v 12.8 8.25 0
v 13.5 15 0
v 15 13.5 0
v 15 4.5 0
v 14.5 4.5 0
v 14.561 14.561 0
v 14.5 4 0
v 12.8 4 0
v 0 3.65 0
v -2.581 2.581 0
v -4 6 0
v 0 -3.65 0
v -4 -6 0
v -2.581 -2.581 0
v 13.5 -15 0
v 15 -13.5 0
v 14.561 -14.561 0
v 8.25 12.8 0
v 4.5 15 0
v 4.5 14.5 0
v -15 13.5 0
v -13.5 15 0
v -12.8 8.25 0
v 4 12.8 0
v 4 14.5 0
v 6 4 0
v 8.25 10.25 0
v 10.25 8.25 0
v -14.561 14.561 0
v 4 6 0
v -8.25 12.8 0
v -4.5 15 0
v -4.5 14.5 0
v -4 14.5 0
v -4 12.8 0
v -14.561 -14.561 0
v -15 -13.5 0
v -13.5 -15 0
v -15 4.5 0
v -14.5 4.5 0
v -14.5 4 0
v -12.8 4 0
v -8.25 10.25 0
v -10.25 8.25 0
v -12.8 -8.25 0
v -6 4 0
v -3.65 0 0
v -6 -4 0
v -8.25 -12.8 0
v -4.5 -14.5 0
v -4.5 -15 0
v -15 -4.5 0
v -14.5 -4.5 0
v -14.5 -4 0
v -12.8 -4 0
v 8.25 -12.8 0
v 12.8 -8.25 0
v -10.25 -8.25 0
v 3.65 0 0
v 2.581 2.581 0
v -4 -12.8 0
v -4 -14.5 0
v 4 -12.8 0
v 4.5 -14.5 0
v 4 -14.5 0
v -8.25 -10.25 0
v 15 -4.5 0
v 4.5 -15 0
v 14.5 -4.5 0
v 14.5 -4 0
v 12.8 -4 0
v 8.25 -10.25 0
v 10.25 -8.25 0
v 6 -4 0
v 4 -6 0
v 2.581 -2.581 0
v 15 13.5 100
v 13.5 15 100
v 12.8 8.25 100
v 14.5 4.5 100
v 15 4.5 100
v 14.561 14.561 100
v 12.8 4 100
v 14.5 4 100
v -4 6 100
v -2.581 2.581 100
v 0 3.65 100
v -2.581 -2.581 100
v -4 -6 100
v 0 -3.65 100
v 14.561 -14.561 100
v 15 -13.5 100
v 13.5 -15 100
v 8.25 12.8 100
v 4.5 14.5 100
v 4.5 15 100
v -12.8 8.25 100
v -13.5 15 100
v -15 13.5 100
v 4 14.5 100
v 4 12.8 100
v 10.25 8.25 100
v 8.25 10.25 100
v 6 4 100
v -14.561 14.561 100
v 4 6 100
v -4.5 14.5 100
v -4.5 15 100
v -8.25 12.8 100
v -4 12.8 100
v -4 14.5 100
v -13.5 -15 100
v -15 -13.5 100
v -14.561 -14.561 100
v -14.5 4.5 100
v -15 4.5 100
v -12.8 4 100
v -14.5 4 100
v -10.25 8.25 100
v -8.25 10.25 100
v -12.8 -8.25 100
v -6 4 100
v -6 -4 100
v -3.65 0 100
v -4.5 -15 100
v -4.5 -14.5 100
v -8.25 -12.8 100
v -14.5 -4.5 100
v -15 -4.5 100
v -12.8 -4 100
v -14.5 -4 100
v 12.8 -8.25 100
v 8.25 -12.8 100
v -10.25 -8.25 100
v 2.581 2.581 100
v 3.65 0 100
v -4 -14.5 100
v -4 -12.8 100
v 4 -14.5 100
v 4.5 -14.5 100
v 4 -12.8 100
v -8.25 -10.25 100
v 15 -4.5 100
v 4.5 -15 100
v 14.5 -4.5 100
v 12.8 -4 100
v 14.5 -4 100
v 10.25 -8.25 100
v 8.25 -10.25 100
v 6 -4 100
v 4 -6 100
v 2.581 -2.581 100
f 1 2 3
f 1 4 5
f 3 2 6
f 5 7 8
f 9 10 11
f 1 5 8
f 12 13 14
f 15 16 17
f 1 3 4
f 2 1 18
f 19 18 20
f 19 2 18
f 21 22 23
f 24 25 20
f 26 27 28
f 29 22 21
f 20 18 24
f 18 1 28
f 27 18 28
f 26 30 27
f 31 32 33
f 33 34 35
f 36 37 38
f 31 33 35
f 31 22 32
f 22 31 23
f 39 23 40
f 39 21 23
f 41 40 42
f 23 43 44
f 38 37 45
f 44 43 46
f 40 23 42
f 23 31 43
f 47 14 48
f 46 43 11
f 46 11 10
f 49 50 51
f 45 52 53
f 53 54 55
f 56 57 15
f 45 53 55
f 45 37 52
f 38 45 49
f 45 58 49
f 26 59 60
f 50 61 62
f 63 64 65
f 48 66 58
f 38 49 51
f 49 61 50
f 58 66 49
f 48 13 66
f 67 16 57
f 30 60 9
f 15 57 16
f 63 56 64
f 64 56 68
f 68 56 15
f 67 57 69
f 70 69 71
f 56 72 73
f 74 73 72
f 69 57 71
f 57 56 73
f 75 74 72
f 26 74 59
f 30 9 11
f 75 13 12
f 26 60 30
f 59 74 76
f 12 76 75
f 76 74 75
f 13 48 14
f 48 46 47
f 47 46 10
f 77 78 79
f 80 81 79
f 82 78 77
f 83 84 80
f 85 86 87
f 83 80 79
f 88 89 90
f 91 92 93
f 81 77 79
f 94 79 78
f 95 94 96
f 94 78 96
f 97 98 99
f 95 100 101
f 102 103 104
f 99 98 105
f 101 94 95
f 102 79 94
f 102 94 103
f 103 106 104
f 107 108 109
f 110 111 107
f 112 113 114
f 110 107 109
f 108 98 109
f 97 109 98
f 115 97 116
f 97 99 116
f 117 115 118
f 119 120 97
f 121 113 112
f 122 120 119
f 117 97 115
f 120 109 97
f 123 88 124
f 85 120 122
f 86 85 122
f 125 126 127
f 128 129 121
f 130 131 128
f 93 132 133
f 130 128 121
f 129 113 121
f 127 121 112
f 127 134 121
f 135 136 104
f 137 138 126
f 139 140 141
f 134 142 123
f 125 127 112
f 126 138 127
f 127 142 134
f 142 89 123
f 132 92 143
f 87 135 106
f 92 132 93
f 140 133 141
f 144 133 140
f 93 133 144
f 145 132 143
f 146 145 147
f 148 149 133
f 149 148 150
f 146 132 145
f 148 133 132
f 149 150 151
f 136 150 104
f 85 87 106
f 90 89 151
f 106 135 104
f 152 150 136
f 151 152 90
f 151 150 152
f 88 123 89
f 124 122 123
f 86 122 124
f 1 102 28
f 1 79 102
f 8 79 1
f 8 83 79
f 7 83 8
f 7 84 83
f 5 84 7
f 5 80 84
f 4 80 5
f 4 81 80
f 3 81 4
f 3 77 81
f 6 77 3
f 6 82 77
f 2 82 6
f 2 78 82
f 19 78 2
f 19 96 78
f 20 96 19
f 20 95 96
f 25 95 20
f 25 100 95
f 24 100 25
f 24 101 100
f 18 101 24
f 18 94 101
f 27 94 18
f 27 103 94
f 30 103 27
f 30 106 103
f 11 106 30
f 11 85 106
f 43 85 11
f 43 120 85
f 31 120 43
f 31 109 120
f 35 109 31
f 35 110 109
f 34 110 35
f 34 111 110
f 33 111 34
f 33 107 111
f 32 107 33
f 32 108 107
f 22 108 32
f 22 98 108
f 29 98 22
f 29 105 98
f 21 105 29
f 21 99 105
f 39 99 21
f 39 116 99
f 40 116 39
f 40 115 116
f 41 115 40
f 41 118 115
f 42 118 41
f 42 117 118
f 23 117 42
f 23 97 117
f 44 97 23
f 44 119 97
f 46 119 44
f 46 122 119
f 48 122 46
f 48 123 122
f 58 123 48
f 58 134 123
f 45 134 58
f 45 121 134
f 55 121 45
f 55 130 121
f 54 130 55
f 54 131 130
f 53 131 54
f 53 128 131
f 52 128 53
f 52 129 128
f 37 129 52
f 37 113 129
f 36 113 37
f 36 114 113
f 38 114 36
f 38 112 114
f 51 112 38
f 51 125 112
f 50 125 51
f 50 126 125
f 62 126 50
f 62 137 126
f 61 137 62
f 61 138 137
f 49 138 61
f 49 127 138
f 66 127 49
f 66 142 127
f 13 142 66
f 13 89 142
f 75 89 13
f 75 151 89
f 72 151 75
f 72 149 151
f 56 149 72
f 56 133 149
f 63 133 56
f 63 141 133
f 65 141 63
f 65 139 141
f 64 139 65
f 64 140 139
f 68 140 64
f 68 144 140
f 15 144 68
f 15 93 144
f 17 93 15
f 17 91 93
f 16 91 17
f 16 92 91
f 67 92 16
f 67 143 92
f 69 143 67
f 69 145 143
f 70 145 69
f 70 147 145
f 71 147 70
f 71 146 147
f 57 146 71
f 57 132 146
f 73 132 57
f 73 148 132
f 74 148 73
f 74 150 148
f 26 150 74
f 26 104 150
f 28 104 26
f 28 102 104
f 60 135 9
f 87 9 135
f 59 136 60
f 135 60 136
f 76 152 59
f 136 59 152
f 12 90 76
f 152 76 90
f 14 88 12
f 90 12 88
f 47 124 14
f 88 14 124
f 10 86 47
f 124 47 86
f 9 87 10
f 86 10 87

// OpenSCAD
// Aleksandr Saechnikov 09 june 2015

ALU_profile(height=100, size=30);

module ALU_profile(size=30, height=10, radius=1.5, step=0.5) {
    echo(height);

	linear_extrude(height=height) {
		union() {
			sub_extrusion_profile(size, radius, step);
			rotate([0,0,90])  sub_extrusion_profile(size, radius, step);
			rotate([0,0,180]) sub_extrusion_profile(size, radius, step);
			rotate([0,0,270]) sub_extrusion_profile(size, radius, step);
		}
	}
    
    module sub_extrusion_profile(size=30, radius = 1.5, step=0.5) {

        reSize = size/30; // Scalling

        k0 = 0;
        k2 = 3.65*reSize;
        k1 = k2*cos(45);

        k3 = 4*reSize;
        k4 = 6*reSize;
        k5 = 8.25*reSize; k5_2 = k5 + k4 - k3;
        k6 = 12.8*reSize;
        k7 = 15*reSize;

        _radius = radius;// OR  *reSize -- Corner radius
        _step = step;    // OR  *reSize -- Step size

        polygon(points=[
            [k1,k1],[0,k2], // Center hole
            [0,k4],[k3,k4],[k5,k5_2],[k5,k6],[k3,k6],
            [k3,k7-_step],[k3+_step,k7-_step],[k3+_step,k7], //Step
            [k7-_radius,k7],[k7-_radius*(1.-cos(45)),k7-_radius*(1.-cos(45))],[k7,k7-_radius],// Corner
            [k7,k3+_step],[k7-_step,k3+_step],[k7-_step,k3], // Step
            [k6,k3],[k6,k5],[k5_2,k5],[k4,k3],[k4,0],
            [k2,0]  // Center hole
        ]);
    }
}
